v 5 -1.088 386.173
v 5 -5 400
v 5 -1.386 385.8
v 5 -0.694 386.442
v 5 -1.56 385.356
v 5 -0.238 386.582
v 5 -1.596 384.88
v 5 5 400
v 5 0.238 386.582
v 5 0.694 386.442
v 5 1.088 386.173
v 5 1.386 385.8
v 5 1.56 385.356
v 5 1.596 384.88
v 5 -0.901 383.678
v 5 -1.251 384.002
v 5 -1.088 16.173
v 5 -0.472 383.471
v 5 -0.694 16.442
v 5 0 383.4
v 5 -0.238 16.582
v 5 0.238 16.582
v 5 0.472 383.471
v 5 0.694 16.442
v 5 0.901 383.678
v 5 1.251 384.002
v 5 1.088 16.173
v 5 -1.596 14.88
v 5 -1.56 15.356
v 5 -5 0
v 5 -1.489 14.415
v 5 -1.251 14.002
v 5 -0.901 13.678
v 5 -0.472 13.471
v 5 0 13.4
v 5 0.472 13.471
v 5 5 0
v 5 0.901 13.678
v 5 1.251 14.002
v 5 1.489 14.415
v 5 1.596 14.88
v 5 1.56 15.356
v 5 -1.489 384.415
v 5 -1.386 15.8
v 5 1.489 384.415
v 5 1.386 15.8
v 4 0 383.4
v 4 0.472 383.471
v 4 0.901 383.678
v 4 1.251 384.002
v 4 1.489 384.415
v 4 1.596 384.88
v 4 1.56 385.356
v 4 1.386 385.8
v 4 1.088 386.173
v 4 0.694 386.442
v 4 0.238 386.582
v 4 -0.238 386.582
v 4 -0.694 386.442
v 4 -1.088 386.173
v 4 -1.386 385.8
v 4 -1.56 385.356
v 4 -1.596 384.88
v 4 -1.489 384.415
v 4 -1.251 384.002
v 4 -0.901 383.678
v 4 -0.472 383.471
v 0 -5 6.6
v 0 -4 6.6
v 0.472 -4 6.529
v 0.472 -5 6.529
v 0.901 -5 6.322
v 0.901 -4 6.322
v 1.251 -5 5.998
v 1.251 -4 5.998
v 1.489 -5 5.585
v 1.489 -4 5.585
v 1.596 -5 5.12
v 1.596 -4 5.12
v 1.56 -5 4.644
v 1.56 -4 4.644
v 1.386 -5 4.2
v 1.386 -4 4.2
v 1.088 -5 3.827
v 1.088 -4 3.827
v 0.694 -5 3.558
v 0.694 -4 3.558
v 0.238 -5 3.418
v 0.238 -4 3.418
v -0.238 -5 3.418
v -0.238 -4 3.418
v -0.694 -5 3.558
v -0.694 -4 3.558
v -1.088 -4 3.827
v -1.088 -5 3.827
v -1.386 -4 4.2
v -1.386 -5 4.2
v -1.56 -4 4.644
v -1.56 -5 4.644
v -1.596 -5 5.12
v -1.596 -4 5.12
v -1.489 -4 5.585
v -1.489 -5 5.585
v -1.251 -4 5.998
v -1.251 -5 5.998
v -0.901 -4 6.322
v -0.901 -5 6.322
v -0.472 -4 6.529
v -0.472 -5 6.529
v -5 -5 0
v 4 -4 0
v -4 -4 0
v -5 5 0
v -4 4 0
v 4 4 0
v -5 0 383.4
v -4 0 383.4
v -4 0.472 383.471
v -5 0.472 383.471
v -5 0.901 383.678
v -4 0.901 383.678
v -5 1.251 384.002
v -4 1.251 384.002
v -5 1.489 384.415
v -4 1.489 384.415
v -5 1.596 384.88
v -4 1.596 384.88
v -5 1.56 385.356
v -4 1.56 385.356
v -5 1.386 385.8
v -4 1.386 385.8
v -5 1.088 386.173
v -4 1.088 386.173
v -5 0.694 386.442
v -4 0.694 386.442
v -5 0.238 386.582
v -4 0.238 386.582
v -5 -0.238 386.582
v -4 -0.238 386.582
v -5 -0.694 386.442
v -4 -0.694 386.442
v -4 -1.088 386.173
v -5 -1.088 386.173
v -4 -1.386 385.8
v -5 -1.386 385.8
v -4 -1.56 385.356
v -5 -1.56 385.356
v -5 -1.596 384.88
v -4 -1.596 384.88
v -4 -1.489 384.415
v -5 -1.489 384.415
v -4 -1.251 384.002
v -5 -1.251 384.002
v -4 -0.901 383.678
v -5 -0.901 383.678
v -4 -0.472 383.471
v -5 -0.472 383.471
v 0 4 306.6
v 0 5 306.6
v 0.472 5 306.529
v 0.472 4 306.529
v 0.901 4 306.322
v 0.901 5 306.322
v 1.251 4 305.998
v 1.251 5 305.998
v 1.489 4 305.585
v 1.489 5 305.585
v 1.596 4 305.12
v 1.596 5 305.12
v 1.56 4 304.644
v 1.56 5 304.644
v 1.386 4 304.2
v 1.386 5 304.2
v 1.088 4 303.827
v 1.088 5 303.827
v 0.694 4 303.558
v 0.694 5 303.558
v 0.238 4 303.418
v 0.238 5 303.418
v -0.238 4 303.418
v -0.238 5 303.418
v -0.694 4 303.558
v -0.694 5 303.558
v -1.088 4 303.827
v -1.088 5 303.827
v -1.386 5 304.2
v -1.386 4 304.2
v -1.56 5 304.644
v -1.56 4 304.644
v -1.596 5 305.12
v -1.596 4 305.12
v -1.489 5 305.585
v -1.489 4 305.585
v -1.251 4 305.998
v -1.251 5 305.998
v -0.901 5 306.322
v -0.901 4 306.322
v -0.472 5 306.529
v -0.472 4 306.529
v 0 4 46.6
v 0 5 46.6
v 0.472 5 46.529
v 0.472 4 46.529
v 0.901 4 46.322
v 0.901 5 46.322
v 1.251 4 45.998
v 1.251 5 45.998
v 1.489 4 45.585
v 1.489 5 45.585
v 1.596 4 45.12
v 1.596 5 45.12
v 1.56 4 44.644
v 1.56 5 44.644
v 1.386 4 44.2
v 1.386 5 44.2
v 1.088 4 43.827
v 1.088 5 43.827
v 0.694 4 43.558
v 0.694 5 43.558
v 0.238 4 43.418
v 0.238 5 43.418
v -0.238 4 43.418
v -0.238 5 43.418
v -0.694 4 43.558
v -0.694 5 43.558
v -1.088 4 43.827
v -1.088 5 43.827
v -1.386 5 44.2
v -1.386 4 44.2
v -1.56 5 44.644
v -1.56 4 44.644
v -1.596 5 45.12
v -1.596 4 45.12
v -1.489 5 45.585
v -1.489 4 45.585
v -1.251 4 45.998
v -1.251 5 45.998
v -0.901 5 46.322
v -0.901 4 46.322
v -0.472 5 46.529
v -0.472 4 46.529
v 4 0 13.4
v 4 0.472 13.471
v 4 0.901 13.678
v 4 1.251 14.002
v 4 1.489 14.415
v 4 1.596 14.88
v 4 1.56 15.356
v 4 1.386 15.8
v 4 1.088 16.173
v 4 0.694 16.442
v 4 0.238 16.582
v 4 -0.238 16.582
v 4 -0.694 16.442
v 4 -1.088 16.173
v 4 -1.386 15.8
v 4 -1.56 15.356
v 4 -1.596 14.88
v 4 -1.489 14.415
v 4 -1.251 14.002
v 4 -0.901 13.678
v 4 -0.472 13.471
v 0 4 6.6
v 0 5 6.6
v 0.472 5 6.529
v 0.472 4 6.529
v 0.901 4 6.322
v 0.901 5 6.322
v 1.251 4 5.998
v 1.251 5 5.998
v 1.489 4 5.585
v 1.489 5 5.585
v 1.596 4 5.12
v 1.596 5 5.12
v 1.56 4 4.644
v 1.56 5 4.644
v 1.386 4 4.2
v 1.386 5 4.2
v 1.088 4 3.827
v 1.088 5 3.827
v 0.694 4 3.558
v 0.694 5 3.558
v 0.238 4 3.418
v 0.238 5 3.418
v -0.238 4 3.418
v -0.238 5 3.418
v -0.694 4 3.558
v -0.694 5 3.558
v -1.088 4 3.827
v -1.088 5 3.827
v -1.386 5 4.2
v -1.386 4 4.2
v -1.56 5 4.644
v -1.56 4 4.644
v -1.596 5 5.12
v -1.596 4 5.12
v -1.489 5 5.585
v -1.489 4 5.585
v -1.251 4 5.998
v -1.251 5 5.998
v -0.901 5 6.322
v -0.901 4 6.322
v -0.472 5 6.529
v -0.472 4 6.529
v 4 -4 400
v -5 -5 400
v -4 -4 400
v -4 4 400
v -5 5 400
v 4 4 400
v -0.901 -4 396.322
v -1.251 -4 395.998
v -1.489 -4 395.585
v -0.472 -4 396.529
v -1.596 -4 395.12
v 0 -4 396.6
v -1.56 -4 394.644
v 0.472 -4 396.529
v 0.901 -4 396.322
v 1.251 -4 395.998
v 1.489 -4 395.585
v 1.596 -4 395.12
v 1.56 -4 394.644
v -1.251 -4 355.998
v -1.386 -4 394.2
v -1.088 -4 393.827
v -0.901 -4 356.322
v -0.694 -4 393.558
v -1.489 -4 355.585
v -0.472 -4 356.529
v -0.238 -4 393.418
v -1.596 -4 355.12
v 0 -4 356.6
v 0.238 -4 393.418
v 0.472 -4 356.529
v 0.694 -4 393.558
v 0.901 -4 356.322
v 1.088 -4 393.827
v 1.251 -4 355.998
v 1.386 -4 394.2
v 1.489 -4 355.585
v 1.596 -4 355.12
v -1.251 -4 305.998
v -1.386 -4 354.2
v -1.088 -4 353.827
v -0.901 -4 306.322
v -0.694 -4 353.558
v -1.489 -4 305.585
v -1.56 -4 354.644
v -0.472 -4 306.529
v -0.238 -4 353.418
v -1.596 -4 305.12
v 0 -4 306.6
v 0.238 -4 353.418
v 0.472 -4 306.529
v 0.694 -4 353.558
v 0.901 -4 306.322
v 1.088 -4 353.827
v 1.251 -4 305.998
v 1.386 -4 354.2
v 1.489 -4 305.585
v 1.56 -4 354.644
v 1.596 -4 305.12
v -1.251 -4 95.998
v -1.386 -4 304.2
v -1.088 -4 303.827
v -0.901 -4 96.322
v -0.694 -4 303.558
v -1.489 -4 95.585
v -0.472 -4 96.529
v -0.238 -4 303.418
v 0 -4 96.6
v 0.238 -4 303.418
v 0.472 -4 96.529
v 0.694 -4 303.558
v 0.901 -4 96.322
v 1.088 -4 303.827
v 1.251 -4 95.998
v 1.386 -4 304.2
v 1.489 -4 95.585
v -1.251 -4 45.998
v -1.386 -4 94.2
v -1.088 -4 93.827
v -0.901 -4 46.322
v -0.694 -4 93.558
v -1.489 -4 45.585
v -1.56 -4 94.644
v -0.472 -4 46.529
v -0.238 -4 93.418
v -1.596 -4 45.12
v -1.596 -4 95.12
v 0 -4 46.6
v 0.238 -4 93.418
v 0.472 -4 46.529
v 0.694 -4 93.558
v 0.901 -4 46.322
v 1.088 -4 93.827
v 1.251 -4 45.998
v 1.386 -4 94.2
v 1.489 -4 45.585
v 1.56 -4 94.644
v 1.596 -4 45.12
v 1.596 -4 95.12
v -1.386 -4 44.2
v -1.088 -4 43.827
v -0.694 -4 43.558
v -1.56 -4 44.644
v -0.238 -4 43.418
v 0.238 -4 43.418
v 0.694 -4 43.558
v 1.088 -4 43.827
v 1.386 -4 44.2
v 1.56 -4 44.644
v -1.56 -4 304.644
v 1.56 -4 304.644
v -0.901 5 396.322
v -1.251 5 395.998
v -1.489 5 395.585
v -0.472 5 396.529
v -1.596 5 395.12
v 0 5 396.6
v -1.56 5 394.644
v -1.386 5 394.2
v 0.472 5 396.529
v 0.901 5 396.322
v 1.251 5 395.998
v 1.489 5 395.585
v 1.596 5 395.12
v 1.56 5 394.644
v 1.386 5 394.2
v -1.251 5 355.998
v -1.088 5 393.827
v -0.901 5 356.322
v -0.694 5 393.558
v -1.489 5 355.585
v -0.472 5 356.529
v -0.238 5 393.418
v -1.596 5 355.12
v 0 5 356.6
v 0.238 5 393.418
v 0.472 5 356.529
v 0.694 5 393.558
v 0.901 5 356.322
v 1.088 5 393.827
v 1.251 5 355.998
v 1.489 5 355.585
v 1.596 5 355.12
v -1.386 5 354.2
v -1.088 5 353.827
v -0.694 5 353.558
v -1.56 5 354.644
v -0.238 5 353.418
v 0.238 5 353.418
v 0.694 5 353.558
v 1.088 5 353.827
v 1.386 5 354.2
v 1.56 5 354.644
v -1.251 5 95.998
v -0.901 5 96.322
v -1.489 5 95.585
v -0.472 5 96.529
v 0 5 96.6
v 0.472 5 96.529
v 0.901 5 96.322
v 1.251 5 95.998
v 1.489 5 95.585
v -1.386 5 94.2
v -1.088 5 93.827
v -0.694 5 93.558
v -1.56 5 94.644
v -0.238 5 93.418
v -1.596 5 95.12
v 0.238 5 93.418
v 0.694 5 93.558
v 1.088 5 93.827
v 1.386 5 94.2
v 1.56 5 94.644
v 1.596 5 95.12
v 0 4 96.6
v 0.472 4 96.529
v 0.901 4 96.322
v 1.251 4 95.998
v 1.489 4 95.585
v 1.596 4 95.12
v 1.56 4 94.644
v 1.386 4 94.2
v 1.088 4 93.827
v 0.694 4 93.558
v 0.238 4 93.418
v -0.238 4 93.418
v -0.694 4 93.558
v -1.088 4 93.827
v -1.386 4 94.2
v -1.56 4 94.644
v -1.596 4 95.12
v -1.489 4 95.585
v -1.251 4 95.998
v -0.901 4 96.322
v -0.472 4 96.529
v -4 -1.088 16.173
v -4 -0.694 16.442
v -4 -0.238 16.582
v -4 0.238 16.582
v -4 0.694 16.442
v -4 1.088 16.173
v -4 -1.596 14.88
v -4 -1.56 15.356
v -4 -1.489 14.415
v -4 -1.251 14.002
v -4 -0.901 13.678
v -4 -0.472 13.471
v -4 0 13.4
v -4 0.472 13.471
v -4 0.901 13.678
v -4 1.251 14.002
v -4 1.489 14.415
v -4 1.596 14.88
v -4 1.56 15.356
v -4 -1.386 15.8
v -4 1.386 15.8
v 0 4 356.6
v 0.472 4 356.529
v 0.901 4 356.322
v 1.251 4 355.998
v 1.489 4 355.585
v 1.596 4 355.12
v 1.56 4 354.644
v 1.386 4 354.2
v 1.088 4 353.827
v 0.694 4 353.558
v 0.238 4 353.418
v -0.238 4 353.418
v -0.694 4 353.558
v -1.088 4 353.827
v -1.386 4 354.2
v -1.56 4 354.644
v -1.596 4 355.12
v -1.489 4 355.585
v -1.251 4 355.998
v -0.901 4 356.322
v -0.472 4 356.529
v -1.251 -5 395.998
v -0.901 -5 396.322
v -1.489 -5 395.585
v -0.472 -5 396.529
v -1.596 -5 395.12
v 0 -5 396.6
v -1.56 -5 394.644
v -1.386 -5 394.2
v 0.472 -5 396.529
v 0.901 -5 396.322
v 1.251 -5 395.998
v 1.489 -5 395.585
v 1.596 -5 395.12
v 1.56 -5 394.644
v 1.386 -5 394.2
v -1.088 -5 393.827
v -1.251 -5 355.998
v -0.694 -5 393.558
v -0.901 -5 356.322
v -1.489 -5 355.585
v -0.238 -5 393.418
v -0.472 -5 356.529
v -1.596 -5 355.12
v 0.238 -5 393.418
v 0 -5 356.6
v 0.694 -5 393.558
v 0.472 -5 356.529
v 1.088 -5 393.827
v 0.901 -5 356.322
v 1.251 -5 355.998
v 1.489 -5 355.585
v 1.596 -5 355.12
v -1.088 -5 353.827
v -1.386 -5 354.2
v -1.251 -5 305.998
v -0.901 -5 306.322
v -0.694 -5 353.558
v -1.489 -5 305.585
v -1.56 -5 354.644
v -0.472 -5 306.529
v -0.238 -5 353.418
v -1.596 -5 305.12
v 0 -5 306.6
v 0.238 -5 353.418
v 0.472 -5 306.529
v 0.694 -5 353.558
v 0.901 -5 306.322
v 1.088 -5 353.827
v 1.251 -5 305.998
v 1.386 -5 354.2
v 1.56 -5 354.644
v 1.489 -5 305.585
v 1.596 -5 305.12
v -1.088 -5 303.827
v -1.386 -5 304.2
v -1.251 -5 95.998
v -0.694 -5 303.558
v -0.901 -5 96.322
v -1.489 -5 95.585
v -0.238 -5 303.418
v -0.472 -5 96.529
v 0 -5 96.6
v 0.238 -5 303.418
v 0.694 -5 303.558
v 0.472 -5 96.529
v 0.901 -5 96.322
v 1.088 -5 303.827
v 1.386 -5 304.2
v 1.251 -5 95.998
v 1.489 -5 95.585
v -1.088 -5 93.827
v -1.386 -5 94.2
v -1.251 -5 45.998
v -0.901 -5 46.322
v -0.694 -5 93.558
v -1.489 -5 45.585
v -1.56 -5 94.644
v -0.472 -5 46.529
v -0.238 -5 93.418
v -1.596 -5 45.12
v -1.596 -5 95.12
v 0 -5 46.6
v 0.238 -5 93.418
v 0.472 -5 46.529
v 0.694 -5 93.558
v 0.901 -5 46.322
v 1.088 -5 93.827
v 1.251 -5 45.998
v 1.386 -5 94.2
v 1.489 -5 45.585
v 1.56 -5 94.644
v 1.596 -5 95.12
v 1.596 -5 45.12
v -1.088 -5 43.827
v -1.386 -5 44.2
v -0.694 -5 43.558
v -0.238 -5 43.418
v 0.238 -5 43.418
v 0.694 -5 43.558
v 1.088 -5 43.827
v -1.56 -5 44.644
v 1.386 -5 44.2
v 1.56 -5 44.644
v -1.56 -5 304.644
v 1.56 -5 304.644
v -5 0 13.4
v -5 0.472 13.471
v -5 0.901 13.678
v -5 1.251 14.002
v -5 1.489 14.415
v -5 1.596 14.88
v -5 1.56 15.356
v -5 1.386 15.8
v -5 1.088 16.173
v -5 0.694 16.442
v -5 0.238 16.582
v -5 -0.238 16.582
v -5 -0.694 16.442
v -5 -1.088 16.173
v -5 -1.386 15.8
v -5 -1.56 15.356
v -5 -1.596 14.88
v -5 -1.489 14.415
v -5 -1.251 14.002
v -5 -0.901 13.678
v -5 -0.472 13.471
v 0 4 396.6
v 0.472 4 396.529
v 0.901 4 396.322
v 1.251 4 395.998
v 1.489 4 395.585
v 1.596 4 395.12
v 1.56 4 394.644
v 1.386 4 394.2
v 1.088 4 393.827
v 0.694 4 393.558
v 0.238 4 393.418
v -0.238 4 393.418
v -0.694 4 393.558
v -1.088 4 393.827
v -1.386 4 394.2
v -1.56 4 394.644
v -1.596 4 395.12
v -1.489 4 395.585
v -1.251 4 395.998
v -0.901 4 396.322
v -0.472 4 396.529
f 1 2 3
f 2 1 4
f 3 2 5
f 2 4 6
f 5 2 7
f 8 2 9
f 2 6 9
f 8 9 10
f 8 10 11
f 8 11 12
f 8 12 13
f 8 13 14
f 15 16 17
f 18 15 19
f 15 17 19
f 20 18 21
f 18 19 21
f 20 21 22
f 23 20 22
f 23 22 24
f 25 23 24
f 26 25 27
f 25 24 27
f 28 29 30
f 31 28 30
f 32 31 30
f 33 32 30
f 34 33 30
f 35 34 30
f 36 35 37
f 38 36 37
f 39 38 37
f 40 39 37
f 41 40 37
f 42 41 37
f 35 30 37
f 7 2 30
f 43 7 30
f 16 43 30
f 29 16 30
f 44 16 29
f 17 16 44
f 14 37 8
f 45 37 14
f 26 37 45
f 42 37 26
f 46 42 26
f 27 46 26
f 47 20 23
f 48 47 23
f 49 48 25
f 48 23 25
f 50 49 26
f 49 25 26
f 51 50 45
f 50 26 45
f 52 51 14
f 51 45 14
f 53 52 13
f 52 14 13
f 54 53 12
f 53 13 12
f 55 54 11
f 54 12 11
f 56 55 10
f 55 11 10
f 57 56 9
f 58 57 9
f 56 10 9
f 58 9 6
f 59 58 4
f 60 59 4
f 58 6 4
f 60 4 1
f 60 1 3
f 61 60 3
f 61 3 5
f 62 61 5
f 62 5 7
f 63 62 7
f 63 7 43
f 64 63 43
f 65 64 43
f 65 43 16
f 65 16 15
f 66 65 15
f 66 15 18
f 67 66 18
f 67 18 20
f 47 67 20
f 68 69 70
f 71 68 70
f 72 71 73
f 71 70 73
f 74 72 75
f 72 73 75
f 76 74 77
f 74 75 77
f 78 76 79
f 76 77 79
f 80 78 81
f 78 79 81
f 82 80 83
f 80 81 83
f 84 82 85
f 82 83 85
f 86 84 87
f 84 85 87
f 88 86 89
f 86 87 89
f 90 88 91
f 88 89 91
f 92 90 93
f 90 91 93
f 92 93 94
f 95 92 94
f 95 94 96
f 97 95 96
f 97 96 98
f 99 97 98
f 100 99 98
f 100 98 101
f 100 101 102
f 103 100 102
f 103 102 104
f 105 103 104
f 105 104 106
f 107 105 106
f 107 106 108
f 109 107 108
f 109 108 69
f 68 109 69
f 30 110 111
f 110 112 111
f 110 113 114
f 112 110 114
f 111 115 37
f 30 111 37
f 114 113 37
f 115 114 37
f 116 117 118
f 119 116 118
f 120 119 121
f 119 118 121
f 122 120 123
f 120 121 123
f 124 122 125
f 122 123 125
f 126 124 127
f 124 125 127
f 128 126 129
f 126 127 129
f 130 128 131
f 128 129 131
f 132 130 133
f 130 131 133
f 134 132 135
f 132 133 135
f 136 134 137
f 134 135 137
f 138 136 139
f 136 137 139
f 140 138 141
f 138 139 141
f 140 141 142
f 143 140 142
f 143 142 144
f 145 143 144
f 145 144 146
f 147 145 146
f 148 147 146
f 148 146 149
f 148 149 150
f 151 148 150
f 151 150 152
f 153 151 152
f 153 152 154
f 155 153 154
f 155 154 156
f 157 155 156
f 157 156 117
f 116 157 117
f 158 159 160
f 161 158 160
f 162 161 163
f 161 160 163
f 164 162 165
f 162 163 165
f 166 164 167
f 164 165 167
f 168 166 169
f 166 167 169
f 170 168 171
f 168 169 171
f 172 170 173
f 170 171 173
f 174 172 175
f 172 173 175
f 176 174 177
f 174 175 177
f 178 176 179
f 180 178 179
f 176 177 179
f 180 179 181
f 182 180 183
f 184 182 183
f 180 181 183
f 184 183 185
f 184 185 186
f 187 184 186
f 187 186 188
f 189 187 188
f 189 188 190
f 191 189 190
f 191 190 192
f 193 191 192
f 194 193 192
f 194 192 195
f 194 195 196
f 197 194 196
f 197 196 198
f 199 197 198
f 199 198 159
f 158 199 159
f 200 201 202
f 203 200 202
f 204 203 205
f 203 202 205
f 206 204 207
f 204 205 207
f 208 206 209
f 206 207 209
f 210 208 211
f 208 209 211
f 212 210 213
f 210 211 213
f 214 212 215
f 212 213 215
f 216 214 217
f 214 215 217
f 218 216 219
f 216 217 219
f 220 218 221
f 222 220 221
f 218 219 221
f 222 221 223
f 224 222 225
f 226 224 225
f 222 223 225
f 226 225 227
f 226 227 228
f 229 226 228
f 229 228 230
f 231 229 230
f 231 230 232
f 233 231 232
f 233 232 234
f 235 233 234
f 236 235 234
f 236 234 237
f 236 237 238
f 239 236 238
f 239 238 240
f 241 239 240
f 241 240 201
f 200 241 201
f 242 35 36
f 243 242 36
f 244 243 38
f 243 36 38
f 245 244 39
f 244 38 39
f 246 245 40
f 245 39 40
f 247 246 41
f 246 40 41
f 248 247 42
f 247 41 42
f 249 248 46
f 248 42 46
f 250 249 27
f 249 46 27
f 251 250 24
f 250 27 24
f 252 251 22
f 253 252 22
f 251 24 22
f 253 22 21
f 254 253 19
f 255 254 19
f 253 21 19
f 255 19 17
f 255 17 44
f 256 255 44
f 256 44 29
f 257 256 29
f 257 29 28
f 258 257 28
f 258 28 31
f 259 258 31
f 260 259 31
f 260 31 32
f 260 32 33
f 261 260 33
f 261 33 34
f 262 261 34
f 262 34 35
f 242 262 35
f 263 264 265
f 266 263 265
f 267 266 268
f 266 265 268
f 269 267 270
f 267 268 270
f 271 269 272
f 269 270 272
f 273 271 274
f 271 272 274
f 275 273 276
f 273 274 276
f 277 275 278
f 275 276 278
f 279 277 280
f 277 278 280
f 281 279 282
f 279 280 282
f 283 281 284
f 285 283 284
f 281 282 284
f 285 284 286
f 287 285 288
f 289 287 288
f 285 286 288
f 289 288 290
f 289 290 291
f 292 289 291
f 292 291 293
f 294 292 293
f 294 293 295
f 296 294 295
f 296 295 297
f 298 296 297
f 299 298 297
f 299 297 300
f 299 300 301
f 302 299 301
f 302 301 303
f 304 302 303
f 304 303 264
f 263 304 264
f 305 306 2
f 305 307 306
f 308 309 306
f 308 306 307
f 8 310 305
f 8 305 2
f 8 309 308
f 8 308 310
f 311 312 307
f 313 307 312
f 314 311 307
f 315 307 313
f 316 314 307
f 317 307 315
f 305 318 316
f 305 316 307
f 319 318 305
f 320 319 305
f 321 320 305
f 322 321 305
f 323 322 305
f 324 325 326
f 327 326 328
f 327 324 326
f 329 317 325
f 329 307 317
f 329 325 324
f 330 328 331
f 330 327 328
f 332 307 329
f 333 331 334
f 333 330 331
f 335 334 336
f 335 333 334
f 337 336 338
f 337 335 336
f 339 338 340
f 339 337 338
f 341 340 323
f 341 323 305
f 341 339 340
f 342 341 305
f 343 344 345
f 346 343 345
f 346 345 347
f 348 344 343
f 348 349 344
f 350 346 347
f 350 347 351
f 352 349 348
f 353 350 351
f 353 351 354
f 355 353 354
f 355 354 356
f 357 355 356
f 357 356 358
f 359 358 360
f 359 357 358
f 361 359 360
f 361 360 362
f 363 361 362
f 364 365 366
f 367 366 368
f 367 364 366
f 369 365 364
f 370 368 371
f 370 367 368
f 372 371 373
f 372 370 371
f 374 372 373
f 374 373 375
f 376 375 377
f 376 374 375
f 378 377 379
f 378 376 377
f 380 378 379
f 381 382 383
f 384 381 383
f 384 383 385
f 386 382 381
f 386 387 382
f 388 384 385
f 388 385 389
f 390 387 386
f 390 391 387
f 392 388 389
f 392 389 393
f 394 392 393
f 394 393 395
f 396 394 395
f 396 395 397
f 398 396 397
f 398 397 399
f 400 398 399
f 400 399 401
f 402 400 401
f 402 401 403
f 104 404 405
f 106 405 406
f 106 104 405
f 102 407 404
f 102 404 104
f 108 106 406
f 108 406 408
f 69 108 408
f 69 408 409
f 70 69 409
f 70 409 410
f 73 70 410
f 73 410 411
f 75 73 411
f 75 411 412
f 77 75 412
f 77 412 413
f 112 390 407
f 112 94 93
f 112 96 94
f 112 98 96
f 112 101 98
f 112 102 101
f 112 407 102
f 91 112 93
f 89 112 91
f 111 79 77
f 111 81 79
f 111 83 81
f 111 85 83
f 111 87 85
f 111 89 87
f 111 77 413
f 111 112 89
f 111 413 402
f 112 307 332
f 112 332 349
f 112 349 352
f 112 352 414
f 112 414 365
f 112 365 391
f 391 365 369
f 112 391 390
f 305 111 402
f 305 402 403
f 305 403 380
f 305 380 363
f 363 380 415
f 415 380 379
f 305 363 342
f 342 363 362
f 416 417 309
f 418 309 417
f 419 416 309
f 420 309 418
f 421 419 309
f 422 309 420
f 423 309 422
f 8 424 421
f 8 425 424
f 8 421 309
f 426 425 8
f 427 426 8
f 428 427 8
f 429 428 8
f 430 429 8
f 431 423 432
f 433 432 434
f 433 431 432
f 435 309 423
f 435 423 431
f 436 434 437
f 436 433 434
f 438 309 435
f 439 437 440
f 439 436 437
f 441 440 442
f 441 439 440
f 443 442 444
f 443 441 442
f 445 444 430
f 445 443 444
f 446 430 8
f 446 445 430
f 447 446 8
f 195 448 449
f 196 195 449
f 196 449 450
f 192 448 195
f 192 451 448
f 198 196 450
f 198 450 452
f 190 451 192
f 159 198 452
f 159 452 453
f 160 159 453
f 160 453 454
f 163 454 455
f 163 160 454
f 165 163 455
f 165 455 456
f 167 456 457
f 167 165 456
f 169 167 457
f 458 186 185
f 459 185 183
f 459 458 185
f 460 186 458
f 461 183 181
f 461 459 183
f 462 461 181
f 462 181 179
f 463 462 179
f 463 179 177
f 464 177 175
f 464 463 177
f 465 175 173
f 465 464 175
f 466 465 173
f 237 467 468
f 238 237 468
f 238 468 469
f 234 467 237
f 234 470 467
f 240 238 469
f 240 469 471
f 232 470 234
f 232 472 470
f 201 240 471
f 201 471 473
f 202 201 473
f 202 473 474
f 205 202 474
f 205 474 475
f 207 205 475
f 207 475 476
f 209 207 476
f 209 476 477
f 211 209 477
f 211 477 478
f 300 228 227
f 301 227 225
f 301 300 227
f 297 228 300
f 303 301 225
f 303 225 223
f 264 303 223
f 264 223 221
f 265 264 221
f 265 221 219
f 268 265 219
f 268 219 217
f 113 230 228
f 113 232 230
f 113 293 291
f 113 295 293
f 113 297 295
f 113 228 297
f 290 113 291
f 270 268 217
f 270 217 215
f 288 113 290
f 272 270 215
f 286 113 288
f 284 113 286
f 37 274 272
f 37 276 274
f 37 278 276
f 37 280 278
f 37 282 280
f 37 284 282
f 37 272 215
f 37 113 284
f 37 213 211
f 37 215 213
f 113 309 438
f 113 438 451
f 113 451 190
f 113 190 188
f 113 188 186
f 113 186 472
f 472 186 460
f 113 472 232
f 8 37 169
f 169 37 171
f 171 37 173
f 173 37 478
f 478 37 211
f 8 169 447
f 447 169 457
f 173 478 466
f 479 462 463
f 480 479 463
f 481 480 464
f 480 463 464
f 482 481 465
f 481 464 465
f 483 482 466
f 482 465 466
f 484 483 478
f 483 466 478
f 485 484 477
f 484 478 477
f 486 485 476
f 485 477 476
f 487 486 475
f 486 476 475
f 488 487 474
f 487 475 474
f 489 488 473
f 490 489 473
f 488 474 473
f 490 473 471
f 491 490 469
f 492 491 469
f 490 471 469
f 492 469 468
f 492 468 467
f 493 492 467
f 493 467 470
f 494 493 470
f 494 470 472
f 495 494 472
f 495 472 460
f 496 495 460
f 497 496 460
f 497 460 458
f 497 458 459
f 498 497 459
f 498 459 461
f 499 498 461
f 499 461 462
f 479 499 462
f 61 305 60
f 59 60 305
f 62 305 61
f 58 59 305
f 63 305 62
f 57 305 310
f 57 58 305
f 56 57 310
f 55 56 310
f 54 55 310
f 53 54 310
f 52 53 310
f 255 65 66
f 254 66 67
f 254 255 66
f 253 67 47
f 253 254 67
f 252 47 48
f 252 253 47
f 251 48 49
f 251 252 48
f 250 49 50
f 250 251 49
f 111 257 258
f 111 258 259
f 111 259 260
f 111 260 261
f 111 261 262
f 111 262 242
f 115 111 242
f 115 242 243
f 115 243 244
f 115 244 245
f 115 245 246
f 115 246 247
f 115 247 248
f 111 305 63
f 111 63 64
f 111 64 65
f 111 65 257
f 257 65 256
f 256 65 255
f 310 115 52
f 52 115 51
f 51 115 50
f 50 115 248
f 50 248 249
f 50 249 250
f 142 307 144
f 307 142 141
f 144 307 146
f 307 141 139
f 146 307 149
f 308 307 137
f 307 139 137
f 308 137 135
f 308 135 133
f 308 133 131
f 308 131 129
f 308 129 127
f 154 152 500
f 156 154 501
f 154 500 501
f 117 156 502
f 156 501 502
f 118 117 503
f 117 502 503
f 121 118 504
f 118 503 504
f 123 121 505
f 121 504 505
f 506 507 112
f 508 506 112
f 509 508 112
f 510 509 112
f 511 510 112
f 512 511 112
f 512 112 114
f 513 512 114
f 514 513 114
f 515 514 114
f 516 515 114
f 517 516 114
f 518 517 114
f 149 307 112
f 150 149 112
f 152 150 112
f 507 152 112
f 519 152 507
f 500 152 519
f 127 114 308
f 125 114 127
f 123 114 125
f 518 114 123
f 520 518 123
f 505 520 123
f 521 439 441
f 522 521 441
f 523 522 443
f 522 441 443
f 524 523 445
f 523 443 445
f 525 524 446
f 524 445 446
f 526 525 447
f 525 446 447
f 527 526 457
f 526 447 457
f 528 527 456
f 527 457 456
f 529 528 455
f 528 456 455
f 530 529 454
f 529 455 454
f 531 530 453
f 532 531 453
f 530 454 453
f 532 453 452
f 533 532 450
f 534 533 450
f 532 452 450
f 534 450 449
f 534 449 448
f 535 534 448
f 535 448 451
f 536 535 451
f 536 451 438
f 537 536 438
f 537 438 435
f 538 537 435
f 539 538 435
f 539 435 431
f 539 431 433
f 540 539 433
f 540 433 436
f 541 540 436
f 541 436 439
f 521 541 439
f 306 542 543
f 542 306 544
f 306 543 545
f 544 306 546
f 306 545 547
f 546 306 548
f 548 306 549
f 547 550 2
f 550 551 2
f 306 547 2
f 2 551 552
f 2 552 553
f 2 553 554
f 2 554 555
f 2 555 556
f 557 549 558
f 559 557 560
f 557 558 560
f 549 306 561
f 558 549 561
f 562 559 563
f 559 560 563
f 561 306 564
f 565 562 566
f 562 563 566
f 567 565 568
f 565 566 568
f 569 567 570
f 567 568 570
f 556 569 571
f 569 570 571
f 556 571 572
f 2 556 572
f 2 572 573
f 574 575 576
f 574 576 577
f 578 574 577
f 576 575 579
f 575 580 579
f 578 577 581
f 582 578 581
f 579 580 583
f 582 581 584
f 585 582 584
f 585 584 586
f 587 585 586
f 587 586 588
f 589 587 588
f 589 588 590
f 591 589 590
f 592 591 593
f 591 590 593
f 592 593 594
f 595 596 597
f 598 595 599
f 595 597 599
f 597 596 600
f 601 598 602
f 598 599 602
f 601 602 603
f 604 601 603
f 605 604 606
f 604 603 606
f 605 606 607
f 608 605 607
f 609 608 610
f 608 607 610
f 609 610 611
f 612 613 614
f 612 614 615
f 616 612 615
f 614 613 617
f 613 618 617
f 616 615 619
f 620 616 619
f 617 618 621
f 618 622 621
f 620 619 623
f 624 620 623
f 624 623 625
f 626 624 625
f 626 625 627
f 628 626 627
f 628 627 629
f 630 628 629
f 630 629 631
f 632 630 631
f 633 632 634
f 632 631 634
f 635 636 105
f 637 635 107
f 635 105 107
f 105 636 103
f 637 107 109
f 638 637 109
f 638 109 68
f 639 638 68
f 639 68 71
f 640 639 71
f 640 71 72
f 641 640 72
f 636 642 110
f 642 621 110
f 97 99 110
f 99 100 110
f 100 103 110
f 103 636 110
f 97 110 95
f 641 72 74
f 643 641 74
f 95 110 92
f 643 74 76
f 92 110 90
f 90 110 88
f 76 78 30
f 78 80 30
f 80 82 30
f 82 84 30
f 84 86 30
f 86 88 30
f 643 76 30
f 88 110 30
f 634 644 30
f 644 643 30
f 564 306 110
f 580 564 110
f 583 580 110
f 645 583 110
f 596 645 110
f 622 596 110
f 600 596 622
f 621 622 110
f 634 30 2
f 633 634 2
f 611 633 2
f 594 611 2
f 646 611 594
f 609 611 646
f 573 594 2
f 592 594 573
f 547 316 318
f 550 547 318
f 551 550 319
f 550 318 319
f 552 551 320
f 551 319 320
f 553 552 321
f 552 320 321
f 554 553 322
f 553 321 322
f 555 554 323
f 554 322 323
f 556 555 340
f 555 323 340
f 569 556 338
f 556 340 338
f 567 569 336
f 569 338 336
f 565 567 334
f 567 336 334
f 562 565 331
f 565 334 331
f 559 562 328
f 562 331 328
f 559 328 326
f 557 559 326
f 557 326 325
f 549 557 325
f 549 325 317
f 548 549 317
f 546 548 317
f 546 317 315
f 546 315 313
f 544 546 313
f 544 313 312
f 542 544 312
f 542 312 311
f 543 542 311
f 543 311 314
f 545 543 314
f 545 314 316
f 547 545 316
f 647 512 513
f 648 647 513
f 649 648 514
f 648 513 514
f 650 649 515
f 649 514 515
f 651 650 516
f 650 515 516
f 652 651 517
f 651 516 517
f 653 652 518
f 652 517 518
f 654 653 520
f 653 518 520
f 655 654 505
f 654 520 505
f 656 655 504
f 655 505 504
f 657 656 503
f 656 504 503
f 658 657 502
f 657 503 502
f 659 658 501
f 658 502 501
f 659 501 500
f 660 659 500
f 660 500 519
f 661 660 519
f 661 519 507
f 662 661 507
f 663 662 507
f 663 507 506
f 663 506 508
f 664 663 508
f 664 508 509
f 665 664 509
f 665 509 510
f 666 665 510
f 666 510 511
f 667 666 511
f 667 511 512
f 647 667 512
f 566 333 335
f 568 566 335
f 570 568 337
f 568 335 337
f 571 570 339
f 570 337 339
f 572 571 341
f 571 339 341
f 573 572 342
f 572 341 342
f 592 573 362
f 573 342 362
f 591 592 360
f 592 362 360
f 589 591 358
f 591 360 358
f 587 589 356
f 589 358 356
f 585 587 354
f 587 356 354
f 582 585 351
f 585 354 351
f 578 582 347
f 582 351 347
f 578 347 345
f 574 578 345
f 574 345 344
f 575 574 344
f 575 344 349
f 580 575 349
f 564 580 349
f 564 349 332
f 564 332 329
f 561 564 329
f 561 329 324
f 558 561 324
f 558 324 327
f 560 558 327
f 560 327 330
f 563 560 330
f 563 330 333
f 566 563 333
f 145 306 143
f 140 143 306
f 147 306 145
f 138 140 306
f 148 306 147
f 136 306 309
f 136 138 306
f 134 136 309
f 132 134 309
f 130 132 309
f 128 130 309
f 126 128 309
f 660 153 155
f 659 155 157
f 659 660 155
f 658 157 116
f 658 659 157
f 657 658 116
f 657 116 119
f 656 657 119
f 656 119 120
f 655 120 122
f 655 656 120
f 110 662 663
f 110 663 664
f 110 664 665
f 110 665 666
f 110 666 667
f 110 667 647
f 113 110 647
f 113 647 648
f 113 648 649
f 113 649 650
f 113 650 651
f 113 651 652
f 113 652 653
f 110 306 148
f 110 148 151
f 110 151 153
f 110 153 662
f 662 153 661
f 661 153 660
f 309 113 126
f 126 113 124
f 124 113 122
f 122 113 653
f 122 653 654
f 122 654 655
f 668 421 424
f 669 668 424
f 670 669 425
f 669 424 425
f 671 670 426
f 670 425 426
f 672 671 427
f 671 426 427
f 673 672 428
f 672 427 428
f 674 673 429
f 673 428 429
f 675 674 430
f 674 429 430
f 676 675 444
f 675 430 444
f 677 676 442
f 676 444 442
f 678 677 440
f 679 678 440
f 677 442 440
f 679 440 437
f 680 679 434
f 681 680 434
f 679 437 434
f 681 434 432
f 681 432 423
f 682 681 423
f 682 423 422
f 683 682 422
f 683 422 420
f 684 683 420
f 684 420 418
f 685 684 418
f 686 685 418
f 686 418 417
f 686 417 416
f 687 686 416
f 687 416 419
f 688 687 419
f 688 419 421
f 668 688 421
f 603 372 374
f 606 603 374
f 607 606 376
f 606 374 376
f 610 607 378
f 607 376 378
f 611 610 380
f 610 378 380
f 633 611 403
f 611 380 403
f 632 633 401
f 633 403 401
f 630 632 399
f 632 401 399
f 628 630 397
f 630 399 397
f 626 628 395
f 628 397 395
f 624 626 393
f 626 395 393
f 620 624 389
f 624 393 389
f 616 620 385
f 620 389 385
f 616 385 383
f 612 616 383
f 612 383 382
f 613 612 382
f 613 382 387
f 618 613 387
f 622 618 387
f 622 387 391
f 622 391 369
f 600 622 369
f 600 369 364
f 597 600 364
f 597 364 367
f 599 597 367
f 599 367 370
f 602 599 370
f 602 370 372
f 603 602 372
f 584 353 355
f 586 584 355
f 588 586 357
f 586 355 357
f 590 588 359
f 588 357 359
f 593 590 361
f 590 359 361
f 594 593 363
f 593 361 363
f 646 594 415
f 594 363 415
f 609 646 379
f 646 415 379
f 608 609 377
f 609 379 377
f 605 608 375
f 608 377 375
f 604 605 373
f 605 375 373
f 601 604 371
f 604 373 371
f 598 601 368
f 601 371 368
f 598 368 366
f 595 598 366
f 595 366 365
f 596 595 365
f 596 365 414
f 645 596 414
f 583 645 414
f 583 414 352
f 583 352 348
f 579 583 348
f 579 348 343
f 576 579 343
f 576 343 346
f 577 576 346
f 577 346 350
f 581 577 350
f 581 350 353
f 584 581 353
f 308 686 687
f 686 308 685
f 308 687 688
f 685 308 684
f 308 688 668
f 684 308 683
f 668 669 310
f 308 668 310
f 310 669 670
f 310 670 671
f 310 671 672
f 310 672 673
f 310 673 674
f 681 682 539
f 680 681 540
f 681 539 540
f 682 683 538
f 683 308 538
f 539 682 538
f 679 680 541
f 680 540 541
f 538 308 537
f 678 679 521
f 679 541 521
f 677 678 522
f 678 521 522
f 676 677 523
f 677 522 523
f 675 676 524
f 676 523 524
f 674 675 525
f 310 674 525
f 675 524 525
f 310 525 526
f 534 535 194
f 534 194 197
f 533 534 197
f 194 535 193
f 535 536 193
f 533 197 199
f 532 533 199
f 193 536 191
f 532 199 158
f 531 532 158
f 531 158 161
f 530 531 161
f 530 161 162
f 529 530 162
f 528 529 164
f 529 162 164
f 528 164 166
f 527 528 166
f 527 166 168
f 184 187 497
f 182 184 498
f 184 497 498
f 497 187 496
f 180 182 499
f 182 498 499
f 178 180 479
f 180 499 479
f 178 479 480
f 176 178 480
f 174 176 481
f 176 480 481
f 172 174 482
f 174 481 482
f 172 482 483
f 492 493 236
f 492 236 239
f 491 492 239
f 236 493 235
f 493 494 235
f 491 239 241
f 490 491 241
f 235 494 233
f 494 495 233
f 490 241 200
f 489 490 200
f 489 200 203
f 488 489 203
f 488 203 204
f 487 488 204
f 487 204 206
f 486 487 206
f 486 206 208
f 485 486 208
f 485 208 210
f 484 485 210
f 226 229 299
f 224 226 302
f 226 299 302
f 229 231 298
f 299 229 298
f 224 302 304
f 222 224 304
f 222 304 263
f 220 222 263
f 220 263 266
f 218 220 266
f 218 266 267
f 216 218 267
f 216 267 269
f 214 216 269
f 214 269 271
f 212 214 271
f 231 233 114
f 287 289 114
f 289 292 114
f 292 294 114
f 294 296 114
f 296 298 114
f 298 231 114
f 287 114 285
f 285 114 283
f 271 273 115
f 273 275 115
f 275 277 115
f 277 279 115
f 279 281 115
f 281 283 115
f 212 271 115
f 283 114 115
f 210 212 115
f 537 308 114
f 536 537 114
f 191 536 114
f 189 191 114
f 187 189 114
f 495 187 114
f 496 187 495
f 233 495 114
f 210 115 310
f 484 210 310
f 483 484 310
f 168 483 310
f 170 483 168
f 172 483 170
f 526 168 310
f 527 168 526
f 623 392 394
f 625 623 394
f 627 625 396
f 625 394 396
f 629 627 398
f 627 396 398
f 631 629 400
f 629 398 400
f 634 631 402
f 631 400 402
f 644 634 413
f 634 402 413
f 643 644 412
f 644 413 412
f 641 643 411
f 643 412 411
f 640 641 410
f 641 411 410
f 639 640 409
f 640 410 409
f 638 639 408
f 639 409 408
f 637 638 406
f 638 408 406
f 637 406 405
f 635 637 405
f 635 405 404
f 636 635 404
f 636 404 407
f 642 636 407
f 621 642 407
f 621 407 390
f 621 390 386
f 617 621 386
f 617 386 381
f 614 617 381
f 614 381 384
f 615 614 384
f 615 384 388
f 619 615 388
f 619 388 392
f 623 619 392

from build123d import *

# Parameters (mm, degrees)
EXTRUDE_1_OUTLINE_W   = 10
EXTRUDE_1_OUTLINE_H   = 10
EXTRUDE_1_OUTLINE_W_2 = 8
EXTRUDE_1_OUTLINE_H_2 = 8
EXTRUDE_1_DEPTH       = 400
SKETCH_2_R            = 1.6
CUT_EXTRUDE_1_DEPTH   = 401.156219494
SKETCH_3_R            = 1.6
CUT_EXTRUDE_2_DEPTH   = 401.156219494


# Read off the part's stored shape, not the designer's step: 押し出し-薄板1
with BuildPart() as part:
    # 押し出し-薄板1 outline → 押し出し-薄板1 (new body)
    with BuildSketch(Plane.XY):
        Rectangle(EXTRUDE_1_OUTLINE_W, EXTRUDE_1_OUTLINE_H)
        Rectangle(EXTRUDE_1_OUTLINE_W_2, EXTRUDE_1_OUTLINE_H_2, mode=Mode.SUBTRACT)
    extrude(amount=EXTRUDE_1_DEPTH)

    # ｽｹｯﾁ2 → ｶｯﾄ - 押し出し1 (cut, through all)
    with BuildSketch(Plane(origin=(0, 5, 0), x_dir=(1, 0, 0), z_dir=(0, 1, 0))):
        with Locations(Location((0, -355, 0), (0, 0, 270))):
            Circle(SKETCH_2_R)
        with Locations(Location((0, -45, 0), (0, 0, 270))):
            Circle(SKETCH_2_R)
        with Locations(Location((0, -305, 0), (0, 0, 270))):
            Circle(SKETCH_2_R)
        with Locations(Location((0, -95, 0), (0, 0, 270))):
            Circle(SKETCH_2_R)
        with Locations(Location((0, -395, 0), (0, 0, 270))):
            Circle(SKETCH_2_R)
        with Locations(Location((0, -5, 0), (0, 0, 270))):
            Circle(SKETCH_2_R)
    extrude(amount=-CUT_EXTRUDE_1_DEPTH, mode=Mode.SUBTRACT)

    # ｽｹｯﾁ3 → ｶｯﾄ - 押し出し2 (cut, through all)
    with BuildSketch(Plane(origin=(5, 0, 0), x_dir=(0, 0, -1), z_dir=(1, 0, 0))):
        with Locations((-385, 0)):
            Circle(SKETCH_3_R)
        with Locations((-15, 0)):
            Circle(SKETCH_3_R)
    extrude(amount=-CUT_EXTRUDE_2_DEPTH, mode=Mode.SUBTRACT)


solid = part.part
